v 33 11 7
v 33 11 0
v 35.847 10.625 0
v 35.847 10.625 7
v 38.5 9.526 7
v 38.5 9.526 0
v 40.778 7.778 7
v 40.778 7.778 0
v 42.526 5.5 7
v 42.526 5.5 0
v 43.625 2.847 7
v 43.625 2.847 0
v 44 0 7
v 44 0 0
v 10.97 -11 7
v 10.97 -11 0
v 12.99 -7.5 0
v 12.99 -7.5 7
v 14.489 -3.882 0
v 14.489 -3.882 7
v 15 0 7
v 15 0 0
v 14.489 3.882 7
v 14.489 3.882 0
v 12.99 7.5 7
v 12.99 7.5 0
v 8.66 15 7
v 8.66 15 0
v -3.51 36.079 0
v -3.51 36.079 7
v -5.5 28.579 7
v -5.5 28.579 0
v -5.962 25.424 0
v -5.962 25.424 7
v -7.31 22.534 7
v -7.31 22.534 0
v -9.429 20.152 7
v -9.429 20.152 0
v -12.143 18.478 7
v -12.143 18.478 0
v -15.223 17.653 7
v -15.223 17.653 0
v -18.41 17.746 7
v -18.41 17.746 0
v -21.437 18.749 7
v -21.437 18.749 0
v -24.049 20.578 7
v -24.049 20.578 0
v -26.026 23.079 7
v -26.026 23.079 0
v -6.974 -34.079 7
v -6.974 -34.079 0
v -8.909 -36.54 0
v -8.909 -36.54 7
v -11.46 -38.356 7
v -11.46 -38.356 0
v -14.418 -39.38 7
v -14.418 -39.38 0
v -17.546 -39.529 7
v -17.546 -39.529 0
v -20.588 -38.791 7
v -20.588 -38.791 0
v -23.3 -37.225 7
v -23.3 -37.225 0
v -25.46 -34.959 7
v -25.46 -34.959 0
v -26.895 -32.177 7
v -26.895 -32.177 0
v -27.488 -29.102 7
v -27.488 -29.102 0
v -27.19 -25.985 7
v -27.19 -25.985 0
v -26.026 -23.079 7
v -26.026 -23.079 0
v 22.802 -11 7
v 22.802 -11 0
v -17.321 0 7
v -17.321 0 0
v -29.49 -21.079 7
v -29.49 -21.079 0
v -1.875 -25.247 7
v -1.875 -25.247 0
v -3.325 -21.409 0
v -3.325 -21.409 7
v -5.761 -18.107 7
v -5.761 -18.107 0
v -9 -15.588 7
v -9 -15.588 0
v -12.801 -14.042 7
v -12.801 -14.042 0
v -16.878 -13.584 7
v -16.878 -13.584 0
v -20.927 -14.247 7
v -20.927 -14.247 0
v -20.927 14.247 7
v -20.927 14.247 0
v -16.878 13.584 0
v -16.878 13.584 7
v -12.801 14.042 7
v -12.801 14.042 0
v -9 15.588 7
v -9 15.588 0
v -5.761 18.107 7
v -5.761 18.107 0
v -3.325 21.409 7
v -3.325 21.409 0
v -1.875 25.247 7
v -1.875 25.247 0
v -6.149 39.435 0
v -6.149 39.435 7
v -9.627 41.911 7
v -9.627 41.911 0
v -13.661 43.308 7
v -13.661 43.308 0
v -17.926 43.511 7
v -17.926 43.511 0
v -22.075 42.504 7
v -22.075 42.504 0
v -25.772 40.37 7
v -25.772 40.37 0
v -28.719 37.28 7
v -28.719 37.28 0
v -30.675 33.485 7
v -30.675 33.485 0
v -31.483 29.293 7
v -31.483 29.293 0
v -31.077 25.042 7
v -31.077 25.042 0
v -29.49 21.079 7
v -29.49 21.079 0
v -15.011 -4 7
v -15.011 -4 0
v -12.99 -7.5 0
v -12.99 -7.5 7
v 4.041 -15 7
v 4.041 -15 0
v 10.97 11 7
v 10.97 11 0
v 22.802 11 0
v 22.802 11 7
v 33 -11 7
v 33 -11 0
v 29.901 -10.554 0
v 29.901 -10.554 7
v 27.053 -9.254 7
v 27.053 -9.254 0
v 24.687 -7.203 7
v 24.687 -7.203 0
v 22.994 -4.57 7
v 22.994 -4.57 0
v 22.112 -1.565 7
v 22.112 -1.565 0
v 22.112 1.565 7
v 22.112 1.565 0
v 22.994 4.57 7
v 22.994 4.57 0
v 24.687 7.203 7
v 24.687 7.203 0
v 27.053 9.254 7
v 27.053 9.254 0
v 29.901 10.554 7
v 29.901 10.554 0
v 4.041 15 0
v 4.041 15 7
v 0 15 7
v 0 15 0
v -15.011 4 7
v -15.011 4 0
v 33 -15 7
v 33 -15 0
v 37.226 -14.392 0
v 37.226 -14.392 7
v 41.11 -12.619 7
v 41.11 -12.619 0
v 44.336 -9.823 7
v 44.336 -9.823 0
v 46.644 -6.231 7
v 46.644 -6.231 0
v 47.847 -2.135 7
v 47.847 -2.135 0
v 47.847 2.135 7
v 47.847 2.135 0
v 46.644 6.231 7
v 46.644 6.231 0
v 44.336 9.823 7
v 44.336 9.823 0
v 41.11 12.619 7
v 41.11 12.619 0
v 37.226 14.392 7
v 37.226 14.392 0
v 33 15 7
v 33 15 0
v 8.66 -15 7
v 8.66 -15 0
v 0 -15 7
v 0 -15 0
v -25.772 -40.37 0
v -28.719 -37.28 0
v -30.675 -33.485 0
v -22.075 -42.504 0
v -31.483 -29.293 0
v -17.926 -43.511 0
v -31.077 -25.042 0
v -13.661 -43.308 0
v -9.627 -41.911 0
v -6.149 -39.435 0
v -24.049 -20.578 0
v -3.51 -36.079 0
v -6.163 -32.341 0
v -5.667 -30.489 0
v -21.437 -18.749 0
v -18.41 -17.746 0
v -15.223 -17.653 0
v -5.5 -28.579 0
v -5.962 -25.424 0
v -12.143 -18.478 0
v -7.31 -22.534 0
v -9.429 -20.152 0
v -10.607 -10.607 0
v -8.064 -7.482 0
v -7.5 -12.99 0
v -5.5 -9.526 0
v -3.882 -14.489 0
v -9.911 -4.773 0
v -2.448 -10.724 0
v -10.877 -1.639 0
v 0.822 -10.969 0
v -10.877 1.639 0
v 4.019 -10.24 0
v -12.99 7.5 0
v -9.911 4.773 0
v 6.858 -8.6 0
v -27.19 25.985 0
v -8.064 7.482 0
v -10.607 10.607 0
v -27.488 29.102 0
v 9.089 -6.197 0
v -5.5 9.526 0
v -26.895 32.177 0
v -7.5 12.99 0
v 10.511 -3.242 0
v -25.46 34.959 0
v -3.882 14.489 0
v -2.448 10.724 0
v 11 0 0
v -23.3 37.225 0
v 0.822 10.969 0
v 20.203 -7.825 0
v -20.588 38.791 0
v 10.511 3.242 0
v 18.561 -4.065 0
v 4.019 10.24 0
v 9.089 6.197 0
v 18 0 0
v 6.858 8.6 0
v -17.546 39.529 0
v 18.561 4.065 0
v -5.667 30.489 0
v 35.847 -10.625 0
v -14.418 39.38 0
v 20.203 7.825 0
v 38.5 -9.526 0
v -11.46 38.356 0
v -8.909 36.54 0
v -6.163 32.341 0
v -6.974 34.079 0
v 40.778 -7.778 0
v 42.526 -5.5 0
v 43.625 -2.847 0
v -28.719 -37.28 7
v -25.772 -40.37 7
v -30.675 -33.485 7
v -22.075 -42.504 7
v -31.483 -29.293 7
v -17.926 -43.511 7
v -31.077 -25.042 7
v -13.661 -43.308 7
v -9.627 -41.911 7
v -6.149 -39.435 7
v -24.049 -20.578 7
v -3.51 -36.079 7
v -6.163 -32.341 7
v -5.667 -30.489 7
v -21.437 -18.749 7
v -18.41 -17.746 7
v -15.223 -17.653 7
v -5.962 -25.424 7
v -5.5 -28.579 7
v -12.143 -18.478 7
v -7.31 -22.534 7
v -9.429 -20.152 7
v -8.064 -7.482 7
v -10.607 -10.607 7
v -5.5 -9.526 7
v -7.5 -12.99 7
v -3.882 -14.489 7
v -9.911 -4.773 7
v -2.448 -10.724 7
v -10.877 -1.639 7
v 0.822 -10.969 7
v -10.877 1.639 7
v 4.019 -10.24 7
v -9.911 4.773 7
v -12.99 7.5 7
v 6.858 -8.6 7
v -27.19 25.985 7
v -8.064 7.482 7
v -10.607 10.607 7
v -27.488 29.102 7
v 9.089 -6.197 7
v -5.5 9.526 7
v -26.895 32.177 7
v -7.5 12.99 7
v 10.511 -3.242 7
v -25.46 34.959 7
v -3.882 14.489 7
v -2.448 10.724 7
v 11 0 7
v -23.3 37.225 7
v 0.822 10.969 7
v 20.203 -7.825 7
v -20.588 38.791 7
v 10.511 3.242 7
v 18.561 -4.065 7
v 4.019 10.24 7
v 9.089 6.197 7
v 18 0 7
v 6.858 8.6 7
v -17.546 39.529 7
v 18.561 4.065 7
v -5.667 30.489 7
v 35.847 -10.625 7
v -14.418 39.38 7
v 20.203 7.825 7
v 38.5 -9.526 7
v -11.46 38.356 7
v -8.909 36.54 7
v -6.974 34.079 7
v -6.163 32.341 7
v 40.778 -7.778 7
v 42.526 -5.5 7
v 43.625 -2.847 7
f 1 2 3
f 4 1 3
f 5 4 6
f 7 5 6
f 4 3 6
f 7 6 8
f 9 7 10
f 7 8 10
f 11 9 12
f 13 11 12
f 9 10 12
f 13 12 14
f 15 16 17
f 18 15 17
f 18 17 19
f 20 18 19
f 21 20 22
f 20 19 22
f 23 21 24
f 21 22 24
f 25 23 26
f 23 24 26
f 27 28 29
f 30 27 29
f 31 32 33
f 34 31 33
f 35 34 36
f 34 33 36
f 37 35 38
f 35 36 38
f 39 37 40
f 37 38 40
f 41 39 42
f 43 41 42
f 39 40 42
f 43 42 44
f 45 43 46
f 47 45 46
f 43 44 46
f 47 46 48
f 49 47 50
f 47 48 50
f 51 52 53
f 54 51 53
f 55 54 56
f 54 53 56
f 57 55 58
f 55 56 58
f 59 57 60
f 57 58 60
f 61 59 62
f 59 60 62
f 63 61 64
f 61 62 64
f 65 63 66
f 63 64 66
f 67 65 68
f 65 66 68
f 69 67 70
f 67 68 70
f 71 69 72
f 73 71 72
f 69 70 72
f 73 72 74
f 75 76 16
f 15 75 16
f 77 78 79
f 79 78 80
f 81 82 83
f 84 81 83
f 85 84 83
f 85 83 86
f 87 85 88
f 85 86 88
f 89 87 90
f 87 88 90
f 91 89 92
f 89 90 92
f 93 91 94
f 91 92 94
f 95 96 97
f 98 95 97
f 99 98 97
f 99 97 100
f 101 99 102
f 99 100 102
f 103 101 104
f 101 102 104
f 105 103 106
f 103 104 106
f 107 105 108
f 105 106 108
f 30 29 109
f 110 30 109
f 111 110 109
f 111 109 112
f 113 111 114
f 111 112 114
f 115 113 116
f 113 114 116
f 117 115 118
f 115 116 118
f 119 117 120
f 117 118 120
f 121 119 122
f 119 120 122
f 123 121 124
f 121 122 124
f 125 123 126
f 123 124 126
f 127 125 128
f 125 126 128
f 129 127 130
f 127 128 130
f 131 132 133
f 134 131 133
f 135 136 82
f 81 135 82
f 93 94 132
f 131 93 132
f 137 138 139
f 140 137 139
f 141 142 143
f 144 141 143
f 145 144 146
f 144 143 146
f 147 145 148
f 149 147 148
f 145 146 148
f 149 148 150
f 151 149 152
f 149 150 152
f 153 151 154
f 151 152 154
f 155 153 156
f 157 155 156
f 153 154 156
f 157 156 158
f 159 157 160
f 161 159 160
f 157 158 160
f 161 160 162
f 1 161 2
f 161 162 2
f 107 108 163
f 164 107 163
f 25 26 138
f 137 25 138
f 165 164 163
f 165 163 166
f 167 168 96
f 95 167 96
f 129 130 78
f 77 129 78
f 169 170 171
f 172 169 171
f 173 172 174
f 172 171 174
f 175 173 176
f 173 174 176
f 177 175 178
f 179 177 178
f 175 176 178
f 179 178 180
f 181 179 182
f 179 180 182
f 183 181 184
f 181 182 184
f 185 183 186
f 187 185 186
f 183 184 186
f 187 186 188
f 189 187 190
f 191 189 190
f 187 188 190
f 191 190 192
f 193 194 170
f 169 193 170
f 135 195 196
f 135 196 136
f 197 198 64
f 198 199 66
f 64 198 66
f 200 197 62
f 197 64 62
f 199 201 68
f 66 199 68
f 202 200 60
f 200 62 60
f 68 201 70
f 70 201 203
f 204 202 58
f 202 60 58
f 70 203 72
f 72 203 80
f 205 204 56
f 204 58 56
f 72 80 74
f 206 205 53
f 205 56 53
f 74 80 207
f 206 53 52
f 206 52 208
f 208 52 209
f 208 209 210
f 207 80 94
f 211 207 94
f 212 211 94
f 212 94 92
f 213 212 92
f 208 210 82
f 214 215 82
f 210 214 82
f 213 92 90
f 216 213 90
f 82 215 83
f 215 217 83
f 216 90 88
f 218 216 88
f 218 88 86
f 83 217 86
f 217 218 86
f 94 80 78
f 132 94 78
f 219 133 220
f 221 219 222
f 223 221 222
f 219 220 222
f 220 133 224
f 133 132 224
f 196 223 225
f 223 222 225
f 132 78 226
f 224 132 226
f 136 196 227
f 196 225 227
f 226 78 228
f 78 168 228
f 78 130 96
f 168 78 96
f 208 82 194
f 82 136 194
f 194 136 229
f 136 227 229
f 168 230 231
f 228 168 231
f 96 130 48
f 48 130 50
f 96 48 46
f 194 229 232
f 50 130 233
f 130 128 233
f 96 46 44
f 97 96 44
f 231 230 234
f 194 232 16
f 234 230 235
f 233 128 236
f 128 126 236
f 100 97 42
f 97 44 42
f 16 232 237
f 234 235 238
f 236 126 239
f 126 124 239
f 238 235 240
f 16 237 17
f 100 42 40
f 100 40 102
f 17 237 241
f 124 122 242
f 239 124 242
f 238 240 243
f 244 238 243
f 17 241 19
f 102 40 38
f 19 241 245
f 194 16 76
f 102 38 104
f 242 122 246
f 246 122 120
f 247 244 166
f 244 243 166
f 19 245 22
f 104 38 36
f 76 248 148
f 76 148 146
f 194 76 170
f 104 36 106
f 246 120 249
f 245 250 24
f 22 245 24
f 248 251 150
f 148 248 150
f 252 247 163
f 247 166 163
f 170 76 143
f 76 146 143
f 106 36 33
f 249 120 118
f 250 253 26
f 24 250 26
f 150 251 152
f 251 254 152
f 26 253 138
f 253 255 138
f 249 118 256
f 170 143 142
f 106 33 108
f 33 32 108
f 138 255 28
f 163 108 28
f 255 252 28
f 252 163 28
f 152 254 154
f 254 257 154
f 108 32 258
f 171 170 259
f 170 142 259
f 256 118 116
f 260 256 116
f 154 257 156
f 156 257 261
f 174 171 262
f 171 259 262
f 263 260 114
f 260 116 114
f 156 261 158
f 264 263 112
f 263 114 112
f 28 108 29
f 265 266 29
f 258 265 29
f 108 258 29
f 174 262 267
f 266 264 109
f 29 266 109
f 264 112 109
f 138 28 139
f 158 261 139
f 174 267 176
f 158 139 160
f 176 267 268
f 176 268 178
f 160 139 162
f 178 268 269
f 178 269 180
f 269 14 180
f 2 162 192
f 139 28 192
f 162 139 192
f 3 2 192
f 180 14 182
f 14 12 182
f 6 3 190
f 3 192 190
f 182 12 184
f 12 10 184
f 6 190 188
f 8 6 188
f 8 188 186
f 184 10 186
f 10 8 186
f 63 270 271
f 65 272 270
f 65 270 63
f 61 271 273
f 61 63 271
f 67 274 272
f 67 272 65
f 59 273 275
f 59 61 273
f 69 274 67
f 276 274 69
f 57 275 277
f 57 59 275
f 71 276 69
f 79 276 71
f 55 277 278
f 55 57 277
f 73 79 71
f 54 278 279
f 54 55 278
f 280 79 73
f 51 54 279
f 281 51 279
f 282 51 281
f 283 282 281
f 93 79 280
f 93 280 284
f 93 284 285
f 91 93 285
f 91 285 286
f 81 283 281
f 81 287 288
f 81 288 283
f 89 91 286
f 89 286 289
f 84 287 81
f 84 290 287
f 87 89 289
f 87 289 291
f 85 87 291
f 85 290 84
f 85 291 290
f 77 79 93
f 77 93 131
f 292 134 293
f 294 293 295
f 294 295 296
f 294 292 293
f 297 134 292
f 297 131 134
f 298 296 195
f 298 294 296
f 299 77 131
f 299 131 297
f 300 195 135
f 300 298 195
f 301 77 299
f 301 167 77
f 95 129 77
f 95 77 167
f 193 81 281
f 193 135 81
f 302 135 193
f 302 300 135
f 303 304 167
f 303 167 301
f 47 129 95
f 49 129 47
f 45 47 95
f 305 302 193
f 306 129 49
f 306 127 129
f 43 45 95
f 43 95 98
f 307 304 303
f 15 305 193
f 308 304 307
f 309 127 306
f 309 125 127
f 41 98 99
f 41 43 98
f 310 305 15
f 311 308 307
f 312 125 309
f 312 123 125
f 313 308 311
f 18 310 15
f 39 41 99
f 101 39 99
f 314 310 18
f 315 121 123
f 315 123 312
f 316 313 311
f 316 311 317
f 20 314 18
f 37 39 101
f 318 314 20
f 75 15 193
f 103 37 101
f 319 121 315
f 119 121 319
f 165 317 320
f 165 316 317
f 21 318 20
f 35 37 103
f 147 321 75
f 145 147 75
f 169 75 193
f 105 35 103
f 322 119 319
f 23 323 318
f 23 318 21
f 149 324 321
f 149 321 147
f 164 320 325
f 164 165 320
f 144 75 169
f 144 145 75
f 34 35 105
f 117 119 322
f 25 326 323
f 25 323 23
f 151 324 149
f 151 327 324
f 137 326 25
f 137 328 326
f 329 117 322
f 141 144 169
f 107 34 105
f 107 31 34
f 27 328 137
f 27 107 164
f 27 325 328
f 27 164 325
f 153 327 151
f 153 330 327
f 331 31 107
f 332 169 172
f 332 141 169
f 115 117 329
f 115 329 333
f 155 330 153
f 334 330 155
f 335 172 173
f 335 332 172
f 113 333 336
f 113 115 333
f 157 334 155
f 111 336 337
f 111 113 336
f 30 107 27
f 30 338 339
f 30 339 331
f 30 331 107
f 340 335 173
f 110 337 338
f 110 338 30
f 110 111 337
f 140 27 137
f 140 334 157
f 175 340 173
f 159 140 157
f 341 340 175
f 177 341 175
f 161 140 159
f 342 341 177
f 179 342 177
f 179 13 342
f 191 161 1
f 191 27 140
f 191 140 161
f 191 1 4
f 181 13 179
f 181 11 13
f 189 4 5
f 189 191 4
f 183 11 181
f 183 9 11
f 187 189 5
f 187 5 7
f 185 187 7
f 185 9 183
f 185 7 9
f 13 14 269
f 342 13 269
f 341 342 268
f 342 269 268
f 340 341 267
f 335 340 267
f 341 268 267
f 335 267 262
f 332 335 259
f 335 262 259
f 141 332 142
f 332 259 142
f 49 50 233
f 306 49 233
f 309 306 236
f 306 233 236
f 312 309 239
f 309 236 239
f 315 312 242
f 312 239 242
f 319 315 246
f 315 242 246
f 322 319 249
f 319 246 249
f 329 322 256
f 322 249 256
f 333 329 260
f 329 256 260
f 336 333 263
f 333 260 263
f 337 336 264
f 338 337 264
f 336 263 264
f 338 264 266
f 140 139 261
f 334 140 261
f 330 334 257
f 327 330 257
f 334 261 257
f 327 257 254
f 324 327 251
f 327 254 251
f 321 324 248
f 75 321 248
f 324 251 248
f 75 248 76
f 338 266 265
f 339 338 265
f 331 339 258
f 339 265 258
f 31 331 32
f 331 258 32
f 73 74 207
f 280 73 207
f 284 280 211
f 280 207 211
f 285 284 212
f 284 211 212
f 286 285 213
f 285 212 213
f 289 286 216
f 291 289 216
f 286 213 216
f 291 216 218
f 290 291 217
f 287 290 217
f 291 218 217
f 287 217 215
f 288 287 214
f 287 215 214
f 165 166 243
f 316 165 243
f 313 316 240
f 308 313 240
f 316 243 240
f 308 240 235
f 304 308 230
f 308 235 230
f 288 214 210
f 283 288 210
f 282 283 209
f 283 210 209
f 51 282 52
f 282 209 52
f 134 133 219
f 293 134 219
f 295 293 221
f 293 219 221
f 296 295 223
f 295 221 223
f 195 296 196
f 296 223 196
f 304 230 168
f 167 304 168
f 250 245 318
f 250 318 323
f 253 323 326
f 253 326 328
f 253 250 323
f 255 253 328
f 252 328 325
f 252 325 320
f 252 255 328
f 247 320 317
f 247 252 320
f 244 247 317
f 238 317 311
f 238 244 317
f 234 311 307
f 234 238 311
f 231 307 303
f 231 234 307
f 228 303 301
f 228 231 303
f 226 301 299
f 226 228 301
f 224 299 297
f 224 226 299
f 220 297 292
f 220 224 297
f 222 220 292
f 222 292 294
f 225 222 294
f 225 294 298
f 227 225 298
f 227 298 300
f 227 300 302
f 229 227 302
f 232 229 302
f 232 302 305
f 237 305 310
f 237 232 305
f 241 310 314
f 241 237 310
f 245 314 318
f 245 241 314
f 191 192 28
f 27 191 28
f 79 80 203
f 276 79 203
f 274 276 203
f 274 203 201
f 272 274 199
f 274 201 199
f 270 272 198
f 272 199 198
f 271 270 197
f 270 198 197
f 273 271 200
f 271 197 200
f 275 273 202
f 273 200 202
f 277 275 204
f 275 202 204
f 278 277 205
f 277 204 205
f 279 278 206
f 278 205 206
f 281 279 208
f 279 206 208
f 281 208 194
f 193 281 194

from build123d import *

# Parameters (mm, degrees)
F0_R     = 11
F1_DEPTH = 7


# Not quite as in the source:
# - a feature names something its author has since deleted; it is built from what else it names


with BuildPart() as f1:
    # F0 (on Top) → F1 (new body)
    with BuildSketch(Plane.XY):
        with BuildLine():
            Line((-15.0111069989, -4), (-12.9903810568, -7.5))
            ThreePointArc((-12.9903810568, -7.5), (-7.5, -12.9903810568), (0, -15))
            Line((0, -15), (4.0414518843, -15))
            Line((4.0414518843, -15), (-1.8747010448, -25.2470774586))
            ThreePointArc((-1.8747010448, -25.2470774586), (-1.5939696041, -26.9024559592), (-1.5, -28.5788383249))
            ThreePointArc((-1.5, -28.5788383249), (-2.0111126057, -32.4611240014), (-3.5096189432, -36.0788383249))
            Line((-3.5096189432, -36.0788383249), (8.6602540378, -15))
            Line((8.6602540378, -15), (33, -15))
            ThreePointArc((33, -15), (27.5227744249, -13.9642400438), (22.8019609728, -11))
            Line((22.8019609728, -11), (10.9696551146, -11))
            Line((10.9696551146, -11), (12.9903810568, -7.5))
            ThreePointArc((12.9903810568, -7.5), (15, 0), (12.9903810568, 7.5))
            Line((12.9903810568, 7.5), (10.9696551146, 11))
            Line((10.9696551146, 11), (22.8019609728, 11))
            ThreePointArc((22.8019609728, 11), (27.5227744249, 13.9642400438), (33, 15))
            Line((33, 15), (8.6602540378, 15))
            Line((8.6602540378, 15), (-3.5096189432, 36.0788383249))
            ThreePointArc((-3.5096189432, 36.0788383249), (-2.0111126057, 32.4611240014), (-1.5, 28.5788383249))
            ThreePointArc((-1.5, 28.5788383249), (-1.5939696041, 26.9024559592), (-1.8747010448, 25.2470774586))
            Line((-1.8747010448, 25.2470774586), (4.0414518843, 15))
            Line((4.0414518843, 15), (0, 15))
            ThreePointArc((0, 15), (-7.5, 12.9903810568), (-12.9903810568, 7.5))
            Line((-12.9903810568, 7.5), (-15.0111069989, 4))
            Line((-15.0111069989, 4), (-20.927259928, 14.2470774586))
            ThreePointArc((-20.927259928, 14.2470774586), (-25.8547738349, 16.8533018127), (-29.4903810568, 21.0788383249))
            Line((-29.4903810568, 21.0788383249), (-17.3205080757, 0))
            Line((-17.3205080757, 0), (-29.4903810568, -21.0788383249))
            ThreePointArc((-29.4903810568, -21.0788383249), (-25.8547738349, -16.8533018127), (-20.927259928, -14.2470774586))
            Line((-20.927259928, -14.2470774586), (-15.0111069989, -4))
        make_face()
        Circle(F0_R, mode=Mode.SUBTRACT)
        with BuildLine():
            Line((-26.0262794416, -23.0788383249), (-20.927259928, -14.2470774586))
            ThreePointArc((-20.927259928, -14.2470774586), (-25.8547738349, -16.8533018127), (-29.4903810568, -21.0788383249))
            ThreePointArc((-29.4903810568, -21.0788383249), (-24, -41.5692193817), (-3.5096189432, -36.0788383249))
            ThreePointArc((-3.5096189432, -36.0788383249), (-2.0111126057, -32.4611240014), (-1.5, -28.5788383249))
            ThreePointArc((-1.5, -28.5788383249), (-1.5939696041, -26.9024559592), (-1.8747010448, -25.2470774586))
            Line((-1.8747010448, -25.2470774586), (-6.9737205584, -34.0788383249))
            ThreePointArc((-6.9737205584, -34.0788383249), (-22, -38.1051177665), (-26.0262794416, -23.0788383249))
        make_face()
        with BuildLine():
            ThreePointArc((-3.5096189432, 36.0788383249), (-24, 41.5692193817), (-29.4903810568, 21.0788383249))
            ThreePointArc((-29.4903810568, 21.0788383249), (-25.8547738349, 16.8533018127), (-20.927259928, 14.2470774586))
            Line((-20.927259928, 14.2470774586), (-26.0262794416, 23.0788383249))
            ThreePointArc((-26.0262794416, 23.0788383249), (-22, 38.1051177665), (-6.9737205584, 34.0788383249))
            Line((-6.9737205584, 34.0788383249), (-1.8747010448, 25.2470774586))
            ThreePointArc((-1.8747010448, 25.2470774586), (-1.5939696041, 26.9024559592), (-1.5, 28.5788383249))
            ThreePointArc((-1.5, 28.5788383249), (-2.0111126057, 32.4611240014), (-3.5096189432, 36.0788383249))
        make_face()
        with BuildLine():
            ThreePointArc((22.8019609728, -11), (27.5227744249, -13.9642400438), (33, -15))
            ThreePointArc((33, -15), (43.6066017178, -10.6066017178), (48, 0))
            ThreePointArc((48, 0), (43.6066017178, 10.6066017178), (33, 15))
            ThreePointArc((33, 15), (27.5227744249, 13.9642400438), (22.8019609728, 11))
            Line((22.8019609728, 11), (33, 11))
            ThreePointArc((33, 11), (40.7781745931, 7.7781745931), (44, 0))
            ThreePointArc((44, 0), (40.7781745931, -7.7781745931), (33, -11))
            Line((33, -11), (22.8019609728, -11))
        make_face()
        with BuildLine():
            ThreePointArc((22.8019609728, 11), (18, 0), (22.8019609728, -11))
            Line((22.8019609728, -11), (33, -11))
            ThreePointArc((33, -11), (22, 0), (33, 11))
            Line((33, 11), (22.8019609728, 11))
        make_face()
        with BuildLine():
            Line((-26.0262794416, 23.0788383249), (-20.927259928, 14.2470774586))
            ThreePointArc((-20.927259928, 14.2470774586), (-9, 15.5884572681), (-1.8747010448, 25.2470774586))
            Line((-1.8747010448, 25.2470774586), (-6.9737205584, 34.0788383249))
            ThreePointArc((-6.9737205584, 34.0788383249), (-5.8748159108, 31.425847821), (-5.5, 28.5788383249))
            ThreePointArc((-5.5, 28.5788383249), (-13.6529905039, 17.9536542357), (-26.0262794416, 23.0788383249))
        make_face()
        with BuildLine():
            ThreePointArc((-1.8747010448, -25.2470774586), (-9, -15.5884572681), (-20.927259928, -14.2470774586))
            Line((-20.927259928, -14.2470774586), (-26.0262794416, -23.0788383249))
            ThreePointArc((-26.0262794416, -23.0788383249), (-13.6529905039, -17.9536542357), (-5.5, -28.5788383249))
            ThreePointArc((-5.5, -28.5788383249), (-5.8748159108, -31.425847821), (-6.9737205584, -34.0788383249))
            Line((-6.9737205584, -34.0788383249), (-1.8747010448, -25.2470774586))
        make_face()
    extrude(amount=F1_DEPTH)


solid = f1.part
